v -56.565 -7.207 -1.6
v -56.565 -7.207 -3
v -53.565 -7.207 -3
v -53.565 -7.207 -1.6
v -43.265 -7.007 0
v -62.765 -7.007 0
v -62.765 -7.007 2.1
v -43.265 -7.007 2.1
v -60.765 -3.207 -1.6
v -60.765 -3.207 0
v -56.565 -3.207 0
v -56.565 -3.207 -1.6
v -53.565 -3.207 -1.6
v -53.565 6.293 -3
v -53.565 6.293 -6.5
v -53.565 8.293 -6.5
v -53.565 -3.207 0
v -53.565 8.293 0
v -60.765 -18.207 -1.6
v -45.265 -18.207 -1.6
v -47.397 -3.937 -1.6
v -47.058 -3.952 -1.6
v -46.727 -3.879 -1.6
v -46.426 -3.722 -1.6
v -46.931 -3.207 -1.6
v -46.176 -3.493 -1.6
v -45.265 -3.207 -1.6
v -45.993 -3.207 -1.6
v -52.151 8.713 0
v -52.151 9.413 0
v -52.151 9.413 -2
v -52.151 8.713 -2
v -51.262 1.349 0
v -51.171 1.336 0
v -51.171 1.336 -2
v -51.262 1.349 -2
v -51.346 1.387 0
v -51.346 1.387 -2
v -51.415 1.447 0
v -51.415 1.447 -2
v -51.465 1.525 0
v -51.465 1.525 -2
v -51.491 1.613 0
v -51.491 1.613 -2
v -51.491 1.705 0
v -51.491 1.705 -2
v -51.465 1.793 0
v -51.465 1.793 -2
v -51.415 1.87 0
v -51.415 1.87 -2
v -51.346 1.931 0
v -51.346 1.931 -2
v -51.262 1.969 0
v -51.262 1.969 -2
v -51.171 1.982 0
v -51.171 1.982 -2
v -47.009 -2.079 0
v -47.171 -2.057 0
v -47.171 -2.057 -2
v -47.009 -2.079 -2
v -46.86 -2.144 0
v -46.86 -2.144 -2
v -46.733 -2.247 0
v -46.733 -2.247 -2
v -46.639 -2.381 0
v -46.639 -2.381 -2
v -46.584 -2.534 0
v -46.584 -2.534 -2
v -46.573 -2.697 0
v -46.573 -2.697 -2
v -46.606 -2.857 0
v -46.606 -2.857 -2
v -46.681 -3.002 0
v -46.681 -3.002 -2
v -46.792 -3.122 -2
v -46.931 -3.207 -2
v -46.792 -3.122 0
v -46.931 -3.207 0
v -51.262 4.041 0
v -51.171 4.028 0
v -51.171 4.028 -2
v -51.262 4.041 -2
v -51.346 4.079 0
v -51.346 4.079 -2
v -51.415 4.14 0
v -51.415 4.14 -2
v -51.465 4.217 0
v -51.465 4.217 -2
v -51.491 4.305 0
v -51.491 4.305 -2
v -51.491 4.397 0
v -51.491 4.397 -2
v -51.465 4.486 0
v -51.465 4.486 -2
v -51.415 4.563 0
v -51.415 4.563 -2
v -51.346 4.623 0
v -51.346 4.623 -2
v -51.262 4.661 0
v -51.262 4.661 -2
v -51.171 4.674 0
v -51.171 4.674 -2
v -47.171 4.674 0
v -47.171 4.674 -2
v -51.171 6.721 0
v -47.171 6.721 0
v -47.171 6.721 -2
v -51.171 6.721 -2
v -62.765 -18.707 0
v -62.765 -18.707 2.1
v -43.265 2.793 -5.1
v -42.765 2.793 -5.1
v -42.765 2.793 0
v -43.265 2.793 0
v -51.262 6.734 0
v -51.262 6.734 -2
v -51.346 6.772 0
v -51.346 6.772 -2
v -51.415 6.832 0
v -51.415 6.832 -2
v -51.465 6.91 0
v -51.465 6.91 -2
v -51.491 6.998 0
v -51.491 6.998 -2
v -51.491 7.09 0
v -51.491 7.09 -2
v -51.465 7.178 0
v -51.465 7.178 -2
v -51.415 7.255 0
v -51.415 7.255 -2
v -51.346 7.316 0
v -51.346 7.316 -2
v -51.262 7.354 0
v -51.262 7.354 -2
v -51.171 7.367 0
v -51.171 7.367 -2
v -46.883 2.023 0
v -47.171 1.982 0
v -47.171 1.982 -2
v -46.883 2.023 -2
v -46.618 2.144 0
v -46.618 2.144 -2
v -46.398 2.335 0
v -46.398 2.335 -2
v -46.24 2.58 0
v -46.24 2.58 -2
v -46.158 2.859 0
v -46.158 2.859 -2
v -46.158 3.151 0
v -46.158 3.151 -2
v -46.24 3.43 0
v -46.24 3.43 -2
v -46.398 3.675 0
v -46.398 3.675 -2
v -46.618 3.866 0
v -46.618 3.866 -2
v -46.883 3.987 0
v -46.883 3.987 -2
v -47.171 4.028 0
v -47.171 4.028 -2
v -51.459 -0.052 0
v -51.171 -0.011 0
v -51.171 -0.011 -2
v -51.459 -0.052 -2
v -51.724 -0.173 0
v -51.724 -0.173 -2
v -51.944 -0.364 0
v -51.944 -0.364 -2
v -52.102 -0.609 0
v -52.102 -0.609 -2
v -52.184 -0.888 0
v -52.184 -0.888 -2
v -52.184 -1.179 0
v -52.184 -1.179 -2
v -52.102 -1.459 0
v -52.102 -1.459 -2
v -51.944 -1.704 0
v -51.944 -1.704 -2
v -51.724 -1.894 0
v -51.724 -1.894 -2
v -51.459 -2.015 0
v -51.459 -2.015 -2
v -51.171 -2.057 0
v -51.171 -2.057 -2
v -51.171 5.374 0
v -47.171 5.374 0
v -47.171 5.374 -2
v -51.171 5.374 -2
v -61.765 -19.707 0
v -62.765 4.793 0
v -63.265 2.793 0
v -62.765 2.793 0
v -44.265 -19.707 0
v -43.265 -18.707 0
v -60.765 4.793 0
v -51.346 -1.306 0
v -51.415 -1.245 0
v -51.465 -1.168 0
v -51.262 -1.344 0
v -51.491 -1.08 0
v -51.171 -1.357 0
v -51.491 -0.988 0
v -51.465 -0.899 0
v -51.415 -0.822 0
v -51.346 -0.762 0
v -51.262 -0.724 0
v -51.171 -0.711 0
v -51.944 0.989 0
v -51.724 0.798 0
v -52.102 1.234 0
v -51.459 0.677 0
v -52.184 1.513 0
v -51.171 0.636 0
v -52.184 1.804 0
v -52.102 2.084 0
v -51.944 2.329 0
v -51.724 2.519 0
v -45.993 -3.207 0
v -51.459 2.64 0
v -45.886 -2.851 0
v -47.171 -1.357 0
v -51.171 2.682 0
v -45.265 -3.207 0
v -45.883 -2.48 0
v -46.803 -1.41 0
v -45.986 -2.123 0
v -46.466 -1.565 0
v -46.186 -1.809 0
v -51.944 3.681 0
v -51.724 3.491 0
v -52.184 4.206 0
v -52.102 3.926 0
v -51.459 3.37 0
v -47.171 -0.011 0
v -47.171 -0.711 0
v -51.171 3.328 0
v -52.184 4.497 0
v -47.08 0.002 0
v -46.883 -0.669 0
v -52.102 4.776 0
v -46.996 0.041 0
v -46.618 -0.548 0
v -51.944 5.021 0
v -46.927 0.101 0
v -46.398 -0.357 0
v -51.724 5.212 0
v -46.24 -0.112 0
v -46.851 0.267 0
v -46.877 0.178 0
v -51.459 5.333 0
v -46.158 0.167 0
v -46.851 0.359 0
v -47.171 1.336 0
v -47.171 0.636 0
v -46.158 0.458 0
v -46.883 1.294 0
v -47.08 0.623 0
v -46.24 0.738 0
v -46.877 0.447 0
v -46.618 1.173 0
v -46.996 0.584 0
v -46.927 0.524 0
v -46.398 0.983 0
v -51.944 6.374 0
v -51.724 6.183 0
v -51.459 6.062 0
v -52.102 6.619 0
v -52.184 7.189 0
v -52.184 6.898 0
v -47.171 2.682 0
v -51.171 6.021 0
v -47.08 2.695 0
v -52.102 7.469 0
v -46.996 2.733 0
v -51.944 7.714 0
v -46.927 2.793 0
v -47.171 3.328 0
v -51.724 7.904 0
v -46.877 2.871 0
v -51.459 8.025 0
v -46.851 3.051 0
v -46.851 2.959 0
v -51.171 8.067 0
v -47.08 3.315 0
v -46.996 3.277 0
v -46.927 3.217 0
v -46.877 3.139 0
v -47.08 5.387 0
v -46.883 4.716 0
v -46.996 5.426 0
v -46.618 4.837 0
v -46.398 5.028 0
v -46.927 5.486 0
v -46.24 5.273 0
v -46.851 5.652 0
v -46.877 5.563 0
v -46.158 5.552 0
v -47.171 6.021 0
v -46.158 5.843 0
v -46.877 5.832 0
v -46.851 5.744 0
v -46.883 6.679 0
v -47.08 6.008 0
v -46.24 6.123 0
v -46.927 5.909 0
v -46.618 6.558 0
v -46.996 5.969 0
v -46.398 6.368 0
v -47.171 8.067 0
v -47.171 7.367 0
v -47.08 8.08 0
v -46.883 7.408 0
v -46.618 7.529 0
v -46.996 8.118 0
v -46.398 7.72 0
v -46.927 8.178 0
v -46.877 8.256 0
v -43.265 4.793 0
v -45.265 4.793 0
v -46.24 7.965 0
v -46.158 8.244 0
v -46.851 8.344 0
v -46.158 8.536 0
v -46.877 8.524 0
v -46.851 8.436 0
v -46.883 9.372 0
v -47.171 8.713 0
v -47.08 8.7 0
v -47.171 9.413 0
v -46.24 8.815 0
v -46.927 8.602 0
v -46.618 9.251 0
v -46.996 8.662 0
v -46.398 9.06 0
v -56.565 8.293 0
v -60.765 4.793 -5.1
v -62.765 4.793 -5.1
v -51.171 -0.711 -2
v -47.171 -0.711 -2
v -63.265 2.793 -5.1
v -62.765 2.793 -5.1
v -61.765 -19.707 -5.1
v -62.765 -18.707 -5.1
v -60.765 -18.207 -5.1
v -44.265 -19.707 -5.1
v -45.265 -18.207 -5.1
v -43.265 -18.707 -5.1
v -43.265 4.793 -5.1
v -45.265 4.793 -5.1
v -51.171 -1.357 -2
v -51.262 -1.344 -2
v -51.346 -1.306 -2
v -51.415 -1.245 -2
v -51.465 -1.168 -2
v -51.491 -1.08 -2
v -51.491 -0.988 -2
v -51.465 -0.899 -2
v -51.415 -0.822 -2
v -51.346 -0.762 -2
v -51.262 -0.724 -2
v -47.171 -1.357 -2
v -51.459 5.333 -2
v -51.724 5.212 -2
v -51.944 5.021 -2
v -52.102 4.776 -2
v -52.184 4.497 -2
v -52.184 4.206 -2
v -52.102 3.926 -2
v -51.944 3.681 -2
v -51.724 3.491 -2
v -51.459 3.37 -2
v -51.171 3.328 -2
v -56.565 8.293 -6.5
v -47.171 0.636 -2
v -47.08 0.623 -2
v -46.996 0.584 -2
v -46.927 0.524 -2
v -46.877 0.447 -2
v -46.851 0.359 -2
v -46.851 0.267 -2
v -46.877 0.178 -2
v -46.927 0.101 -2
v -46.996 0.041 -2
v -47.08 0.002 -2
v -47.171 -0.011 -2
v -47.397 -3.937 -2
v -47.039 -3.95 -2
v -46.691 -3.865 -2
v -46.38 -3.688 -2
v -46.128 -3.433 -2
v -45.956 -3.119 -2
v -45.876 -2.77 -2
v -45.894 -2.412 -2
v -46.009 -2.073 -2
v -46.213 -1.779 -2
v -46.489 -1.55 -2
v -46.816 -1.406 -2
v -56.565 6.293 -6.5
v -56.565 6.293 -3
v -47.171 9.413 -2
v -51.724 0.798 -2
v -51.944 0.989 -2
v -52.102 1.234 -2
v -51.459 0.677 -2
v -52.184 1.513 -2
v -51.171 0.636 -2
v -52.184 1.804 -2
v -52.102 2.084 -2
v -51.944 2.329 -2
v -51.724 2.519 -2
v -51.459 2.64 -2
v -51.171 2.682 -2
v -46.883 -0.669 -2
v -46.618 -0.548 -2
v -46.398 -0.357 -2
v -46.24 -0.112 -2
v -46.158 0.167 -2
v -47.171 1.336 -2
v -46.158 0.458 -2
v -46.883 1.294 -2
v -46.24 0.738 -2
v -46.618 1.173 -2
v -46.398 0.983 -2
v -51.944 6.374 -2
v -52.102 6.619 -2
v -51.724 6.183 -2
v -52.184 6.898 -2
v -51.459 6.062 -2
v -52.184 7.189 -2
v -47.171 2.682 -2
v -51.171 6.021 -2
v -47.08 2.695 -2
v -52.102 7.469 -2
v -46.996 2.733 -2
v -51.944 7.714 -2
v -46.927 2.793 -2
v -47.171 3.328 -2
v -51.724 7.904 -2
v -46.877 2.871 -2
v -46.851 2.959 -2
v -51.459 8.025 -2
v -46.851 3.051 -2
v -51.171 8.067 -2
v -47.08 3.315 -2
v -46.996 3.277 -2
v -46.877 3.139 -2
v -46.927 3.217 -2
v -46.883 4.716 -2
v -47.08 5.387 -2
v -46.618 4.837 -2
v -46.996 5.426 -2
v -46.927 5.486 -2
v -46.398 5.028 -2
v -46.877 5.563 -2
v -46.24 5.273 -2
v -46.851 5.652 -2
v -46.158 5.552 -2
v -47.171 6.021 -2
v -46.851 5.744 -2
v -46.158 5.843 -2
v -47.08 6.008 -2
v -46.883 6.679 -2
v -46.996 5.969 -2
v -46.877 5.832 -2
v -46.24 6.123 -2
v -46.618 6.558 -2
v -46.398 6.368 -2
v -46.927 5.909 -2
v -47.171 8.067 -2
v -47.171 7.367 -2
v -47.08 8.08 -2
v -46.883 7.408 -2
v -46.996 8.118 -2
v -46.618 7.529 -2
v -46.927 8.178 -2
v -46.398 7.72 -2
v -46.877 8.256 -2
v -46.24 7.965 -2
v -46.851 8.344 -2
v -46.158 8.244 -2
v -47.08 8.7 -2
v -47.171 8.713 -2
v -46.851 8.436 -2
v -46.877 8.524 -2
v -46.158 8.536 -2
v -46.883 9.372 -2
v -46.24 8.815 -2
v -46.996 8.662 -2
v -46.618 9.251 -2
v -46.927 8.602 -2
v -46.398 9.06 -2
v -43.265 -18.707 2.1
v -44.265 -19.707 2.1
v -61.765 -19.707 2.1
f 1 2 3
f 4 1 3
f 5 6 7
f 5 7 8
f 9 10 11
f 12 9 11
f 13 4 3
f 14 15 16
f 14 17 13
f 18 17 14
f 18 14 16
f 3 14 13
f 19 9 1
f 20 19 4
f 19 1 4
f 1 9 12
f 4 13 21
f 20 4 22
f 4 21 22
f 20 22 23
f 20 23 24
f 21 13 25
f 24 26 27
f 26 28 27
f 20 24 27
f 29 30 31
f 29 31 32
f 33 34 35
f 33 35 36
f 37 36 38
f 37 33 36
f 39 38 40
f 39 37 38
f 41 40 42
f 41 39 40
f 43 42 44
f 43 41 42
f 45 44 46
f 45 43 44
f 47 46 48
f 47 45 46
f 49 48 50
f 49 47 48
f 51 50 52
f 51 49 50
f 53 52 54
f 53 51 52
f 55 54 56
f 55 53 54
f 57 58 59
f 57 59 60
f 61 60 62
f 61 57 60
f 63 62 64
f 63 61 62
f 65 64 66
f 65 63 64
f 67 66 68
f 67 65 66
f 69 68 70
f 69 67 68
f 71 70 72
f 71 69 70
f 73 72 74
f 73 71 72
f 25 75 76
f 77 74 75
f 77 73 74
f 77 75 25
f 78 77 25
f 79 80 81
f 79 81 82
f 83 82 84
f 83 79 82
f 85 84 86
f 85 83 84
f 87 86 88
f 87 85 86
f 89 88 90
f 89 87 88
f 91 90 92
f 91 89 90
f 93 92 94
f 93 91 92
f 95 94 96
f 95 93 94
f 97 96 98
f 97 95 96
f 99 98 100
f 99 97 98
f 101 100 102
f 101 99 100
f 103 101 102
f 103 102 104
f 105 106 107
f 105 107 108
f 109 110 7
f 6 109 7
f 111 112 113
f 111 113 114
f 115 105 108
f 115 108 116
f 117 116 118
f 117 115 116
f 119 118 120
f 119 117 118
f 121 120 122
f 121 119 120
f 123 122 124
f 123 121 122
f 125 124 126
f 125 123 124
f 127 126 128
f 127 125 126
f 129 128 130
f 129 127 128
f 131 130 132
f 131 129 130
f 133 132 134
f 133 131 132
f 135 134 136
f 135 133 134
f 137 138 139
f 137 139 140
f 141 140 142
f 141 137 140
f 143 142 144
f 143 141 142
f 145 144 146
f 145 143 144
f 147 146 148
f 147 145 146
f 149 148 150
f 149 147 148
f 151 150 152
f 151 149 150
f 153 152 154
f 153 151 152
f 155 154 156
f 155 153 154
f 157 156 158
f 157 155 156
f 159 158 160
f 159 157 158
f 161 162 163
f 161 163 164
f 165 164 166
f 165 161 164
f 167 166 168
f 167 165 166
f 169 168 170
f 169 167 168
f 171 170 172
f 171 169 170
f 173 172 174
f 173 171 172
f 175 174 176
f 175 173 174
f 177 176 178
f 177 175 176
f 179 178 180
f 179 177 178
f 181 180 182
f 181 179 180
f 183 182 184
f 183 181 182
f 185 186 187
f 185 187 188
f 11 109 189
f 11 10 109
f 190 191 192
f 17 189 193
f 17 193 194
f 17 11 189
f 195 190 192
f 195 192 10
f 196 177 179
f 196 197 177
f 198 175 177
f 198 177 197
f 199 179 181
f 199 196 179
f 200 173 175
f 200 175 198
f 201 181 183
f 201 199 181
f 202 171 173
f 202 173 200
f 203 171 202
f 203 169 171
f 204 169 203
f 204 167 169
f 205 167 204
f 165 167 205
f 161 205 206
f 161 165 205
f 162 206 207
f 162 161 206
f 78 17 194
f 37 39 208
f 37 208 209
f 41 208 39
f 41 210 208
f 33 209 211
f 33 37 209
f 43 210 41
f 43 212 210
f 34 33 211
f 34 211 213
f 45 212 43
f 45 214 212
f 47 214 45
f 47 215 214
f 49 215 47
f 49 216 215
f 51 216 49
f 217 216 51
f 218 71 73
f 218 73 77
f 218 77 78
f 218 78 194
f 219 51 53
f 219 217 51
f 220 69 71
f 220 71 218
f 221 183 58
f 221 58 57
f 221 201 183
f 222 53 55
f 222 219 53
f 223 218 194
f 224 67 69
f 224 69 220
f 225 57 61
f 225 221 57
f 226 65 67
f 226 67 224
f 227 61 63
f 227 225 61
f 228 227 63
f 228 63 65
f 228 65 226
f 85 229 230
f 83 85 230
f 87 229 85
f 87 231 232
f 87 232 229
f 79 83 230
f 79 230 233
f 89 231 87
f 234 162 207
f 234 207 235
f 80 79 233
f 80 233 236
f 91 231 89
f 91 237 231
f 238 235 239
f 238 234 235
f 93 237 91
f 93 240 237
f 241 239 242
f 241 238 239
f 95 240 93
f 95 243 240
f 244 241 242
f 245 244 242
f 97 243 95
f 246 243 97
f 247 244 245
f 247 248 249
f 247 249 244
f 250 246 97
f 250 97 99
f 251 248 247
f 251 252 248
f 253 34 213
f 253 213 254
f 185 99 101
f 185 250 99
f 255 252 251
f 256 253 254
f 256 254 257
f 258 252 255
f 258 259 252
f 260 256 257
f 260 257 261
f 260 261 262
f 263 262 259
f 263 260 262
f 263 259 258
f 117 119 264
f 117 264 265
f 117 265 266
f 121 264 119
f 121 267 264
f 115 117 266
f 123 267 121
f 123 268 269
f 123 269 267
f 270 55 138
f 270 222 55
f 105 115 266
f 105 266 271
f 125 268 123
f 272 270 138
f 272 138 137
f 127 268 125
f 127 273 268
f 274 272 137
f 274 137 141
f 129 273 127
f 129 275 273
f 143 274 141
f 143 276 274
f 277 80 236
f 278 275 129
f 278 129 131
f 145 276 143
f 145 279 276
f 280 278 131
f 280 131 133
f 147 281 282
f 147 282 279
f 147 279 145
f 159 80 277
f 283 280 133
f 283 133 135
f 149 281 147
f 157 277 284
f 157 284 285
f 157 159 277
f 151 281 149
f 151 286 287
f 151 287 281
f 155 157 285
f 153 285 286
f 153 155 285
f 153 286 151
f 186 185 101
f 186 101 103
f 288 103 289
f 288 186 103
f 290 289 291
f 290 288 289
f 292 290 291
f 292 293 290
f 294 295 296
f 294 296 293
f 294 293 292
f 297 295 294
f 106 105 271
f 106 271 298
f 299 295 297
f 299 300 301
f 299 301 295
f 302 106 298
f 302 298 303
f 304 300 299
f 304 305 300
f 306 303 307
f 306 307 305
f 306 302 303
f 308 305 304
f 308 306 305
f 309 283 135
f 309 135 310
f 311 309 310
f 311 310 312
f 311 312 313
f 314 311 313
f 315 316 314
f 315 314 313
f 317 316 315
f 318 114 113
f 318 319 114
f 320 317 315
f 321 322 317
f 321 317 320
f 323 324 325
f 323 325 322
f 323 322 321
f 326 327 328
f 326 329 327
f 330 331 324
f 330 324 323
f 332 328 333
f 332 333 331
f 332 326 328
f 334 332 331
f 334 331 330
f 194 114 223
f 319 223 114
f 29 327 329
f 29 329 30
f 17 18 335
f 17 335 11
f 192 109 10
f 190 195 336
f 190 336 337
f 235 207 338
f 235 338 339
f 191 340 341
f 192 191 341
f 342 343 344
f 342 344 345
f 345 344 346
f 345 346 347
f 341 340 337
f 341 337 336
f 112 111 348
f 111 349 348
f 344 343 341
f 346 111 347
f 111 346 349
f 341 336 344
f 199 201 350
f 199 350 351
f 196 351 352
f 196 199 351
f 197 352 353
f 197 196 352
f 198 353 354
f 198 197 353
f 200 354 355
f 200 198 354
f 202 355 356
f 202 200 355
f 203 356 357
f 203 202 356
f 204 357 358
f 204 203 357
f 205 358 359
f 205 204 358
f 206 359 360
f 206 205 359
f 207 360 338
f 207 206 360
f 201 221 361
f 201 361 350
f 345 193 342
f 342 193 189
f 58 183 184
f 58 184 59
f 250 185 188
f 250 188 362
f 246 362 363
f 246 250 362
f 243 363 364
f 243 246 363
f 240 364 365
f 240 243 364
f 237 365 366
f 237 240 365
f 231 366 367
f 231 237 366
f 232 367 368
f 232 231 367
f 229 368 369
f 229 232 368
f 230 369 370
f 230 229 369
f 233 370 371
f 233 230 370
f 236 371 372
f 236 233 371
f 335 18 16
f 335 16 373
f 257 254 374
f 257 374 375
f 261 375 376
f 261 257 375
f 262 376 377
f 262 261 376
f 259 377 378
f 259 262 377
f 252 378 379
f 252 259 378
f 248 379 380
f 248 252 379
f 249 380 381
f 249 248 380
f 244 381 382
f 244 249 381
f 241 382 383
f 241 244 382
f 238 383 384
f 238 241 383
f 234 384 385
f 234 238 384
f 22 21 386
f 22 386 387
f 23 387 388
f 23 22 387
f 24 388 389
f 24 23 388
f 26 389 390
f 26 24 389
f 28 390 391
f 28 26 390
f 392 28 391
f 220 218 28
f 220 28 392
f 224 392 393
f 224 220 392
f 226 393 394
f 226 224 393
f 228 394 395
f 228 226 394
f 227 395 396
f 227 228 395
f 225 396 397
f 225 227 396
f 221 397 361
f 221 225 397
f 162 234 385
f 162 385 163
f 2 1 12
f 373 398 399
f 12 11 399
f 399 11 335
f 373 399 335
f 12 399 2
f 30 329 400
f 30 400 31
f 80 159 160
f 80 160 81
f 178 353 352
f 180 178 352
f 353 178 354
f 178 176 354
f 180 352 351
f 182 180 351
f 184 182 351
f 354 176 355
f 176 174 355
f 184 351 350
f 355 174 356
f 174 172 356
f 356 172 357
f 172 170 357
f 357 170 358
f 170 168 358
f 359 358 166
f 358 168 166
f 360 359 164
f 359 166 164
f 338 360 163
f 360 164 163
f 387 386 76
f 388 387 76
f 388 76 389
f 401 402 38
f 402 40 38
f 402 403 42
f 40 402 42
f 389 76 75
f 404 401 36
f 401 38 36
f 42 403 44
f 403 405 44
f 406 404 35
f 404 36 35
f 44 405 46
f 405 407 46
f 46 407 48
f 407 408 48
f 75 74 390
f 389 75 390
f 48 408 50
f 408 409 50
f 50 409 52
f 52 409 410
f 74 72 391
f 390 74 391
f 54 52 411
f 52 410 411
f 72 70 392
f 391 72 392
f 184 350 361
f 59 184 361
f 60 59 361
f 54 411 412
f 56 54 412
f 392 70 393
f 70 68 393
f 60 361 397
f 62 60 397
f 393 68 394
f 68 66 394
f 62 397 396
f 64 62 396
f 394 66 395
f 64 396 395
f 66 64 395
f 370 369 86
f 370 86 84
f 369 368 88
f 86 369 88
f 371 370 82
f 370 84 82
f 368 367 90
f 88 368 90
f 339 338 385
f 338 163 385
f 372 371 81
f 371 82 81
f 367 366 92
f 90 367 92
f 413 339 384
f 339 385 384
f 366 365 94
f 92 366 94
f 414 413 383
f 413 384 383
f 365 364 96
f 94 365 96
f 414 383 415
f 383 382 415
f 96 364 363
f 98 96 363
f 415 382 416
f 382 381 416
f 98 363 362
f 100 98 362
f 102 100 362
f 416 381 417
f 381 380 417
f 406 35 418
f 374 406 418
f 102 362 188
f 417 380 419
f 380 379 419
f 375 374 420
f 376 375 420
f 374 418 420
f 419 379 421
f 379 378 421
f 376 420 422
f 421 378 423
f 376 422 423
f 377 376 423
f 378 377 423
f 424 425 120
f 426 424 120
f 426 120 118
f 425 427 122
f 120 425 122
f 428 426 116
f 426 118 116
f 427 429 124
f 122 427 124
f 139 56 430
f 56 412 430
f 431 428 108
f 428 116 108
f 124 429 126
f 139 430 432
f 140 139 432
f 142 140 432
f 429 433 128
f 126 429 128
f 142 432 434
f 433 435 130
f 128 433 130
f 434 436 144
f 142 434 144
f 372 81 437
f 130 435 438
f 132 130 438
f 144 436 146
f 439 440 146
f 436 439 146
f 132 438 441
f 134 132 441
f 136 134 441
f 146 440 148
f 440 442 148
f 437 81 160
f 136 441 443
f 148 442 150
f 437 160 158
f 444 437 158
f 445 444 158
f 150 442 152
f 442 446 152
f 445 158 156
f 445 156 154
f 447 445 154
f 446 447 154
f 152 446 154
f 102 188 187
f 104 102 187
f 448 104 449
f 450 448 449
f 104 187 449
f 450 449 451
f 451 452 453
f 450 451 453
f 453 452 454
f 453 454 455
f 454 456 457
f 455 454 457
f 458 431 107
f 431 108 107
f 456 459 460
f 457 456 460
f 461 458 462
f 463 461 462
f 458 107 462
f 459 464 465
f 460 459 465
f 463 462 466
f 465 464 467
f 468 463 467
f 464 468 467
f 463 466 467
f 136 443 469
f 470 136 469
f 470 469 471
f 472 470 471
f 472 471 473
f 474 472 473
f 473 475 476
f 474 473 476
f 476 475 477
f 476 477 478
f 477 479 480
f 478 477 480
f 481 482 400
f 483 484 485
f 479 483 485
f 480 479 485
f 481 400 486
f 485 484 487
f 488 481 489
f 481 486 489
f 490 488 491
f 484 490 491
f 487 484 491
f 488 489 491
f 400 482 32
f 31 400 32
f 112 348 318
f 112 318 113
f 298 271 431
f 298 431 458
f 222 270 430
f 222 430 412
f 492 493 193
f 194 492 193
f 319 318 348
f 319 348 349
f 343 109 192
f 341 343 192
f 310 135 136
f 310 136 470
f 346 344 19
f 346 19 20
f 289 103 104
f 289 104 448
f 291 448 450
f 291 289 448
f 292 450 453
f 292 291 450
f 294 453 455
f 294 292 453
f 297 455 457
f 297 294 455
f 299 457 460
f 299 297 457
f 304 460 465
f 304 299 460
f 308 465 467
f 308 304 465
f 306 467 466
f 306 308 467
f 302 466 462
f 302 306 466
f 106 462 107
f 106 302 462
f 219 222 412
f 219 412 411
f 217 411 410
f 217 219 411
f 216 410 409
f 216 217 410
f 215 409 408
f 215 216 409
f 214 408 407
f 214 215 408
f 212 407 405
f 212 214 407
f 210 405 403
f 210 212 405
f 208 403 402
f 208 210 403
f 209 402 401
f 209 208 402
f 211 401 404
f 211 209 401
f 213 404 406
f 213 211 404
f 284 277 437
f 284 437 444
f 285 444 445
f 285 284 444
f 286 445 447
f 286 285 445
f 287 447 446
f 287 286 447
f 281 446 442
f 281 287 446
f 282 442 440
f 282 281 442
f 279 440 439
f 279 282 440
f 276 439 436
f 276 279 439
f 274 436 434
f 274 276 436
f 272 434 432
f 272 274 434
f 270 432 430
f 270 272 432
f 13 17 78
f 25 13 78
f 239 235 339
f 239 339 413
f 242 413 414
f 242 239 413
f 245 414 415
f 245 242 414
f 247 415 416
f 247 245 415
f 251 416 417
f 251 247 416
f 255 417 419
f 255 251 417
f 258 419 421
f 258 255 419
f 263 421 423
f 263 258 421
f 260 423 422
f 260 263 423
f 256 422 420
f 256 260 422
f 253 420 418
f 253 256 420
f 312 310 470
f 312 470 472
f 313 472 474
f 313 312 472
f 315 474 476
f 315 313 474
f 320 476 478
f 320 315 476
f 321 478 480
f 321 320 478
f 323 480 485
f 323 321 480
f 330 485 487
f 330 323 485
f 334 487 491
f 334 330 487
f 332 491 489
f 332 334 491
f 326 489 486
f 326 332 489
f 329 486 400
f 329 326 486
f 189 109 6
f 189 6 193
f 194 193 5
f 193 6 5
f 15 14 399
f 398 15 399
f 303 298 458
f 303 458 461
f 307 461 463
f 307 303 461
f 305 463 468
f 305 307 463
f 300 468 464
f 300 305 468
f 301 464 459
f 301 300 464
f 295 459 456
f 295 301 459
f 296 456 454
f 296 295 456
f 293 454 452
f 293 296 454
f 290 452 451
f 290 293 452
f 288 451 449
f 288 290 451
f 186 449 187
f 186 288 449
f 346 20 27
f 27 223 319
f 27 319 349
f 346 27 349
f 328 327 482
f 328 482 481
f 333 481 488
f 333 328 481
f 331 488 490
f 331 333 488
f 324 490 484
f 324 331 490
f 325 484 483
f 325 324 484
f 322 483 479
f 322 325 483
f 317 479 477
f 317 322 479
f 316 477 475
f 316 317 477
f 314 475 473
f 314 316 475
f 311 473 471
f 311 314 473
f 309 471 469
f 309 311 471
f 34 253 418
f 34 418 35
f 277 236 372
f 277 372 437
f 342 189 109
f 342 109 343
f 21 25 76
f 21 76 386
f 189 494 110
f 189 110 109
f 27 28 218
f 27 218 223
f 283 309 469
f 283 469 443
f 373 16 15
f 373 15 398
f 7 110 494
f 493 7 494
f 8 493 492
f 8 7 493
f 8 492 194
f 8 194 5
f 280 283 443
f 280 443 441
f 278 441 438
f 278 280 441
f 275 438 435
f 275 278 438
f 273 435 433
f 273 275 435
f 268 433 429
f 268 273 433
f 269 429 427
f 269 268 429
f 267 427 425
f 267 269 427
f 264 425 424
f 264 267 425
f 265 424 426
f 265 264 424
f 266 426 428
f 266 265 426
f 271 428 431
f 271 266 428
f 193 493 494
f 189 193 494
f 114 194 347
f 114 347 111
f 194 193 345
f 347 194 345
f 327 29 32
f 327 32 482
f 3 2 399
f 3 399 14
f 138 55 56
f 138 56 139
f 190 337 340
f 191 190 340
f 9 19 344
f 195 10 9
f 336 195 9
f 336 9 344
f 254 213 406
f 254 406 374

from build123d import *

# Parameters (mm, degrees)
SKETCH_1_W           = 19.5
SKETCH_1_H           = 12.7
EXTRUDE_1_DEPTH      = 2.1
SKETCH_2_W           = 19.5
SKETCH_2_H           = 24.5
EXTRUDE_2_DEPTH      = 5.1
SKETCH_3_W           = 15.5
SKETCH_3_H           = 3.5
CUT_EXTRUDE_1_DEPTH  = 23
CUT_EXTRUDE_2_REACH  = 67.984
SKETCH_4_W           = 15.5
SKETCH_4_H           = 8
EXTRUDE_4_DEPTH      = 5.1
EXTRUDE_5_DEPTH      = 2
EXTRUDE_6_DEPTH      = 11.5
EXTRUDE_6_DEPTH_BACK = 4
SKETCH_8_W           = 3
SKETCH_8_H           = 3
SKETCH_9_W           = 3
SKETCH_9_H           = 2
EXTRUDE_7_DEPTH      = 3.5
CHAMFER_1_SIZE       = 1


# Read off the part's stored shape, not the designer's step: 分割1
with BuildPart() as part:
    # 草图1 → 凸台-拉伸1 (new body)
    with BuildSketch(Plane.XY):
        with Locations((-53.015330564, -13.356843897)):
            Rectangle(SKETCH_1_W, SKETCH_1_H)
    extrude(amount=EXTRUDE_1_DEPTH)

    # 草图2 → 凸台-拉伸2 (add)
    with BuildSketch(Plane(origin=(0, 0, 0), x_dir=(-1, 0, 0), z_dir=(0, 0, -1))):
        with Locations((53.015330564, -7.456843897)):
            Rectangle(SKETCH_2_W, SKETCH_2_H)
    extrude(amount=EXTRUDE_2_DEPTH)

    # 草图3 → 切除-拉伸1 (cut)
    with BuildSketch(Plane(origin=(0, 4.793156103, 0), x_dir=(1, 0, 0), z_dir=(0, 1, 0))):
        with Locations((-53.015330564, 3.35)):
            Rectangle(SKETCH_3_W, SKETCH_3_H)
    extrude(amount=-CUT_EXTRUDE_1_DEPTH, mode=Mode.SUBTRACT)

    # 草图4 → 切除-拉伸2 (cut, up to next)
    with BuildSketch(Plane.XY, mode=Mode.PRIVATE) as cut_extrude_2_sk1:
        with Locations((-53.015330564, 0.793156103)):
            Rectangle(SKETCH_4_W, SKETCH_4_H)
    cut_extrude_2_tool1 = extrude(cut_extrude_2_sk1.sketch, amount=-CUT_EXTRUDE_2_REACH, mode=Mode.PRIVATE) & part.part
    add(cut_extrude_2_tool1.solids().sort_by_distance((-53.015331, 0.793156, 0))[0], mode=Mode.SUBTRACT)

    # 草图5 → 凸台-拉伸4 (add)
    with BuildSketch(Plane(origin=(0, 0, -5.1), x_dir=(-1, 0, 0), z_dir=(0, 0, -1))):
        Polygon((62.765330564, 4.793156103), (63.265330564, 2.793156103), (62.765330564, 2.793156103), align=None)
        Polygon((43.265330564, 4.793156103), (42.765330564, 2.793156103), (43.265330564, 2.793156103), align=None)
    extrude(amount=-EXTRUDE_4_DEPTH)

    # 草图7 → 凸台-拉伸5 (add)
    with BuildSketch(Plane.XY):
        with BuildLine():
            Line((-47.171144023, -1.356843897), (-51.171144023, -1.356843897))
            ThreePointArc((-51.171144023, -1.356843897), (-51.494269023, -1.033718897), (-51.171144023, -0.710593897))
            Line((-51.171144023, -0.710593897), (-47.171144023, -0.710593897))
            ThreePointArc((-47.171144023, -0.710593897), (-46.148019023, 0.312531103), (-47.171144023, 1.335656103))
            Line((-47.171144023, 1.335656103), (-51.171144023, 1.335656103))
            ThreePointArc((-51.171144023, 1.335656103), (-51.494269023, 1.658781103), (-51.171144023, 1.981906103))
            Line((-51.171144023, 1.981906103), (-47.171144023, 1.981906103))
            ThreePointArc((-47.171144023, 1.981906103), (-46.148019023, 3.005031103), (-47.171144023, 4.028156103))
            Line((-47.171144023, 4.028156103), (-51.171144023, 4.028156103))
            ThreePointArc((-51.171144023, 4.028156103), (-51.494269023, 4.351281103), (-51.171144023, 4.674406103))
            Line((-51.171144023, 4.674406103), (-47.171144023, 4.674406103))
            ThreePointArc((-47.171144023, 4.674406103), (-46.148019023, 5.697531103), (-47.171144023, 6.720656103))
            Line((-47.171144023, 6.720656103), (-51.171144023, 6.720656103))
            ThreePointArc((-51.171144023, 6.720656103), (-51.494269023, 7.043781103), (-51.171144023, 7.366906103))
            Line((-51.171144023, 7.366906103), (-47.171144023, 7.366906103))
            ThreePointArc((-47.171144023, 7.366906103), (-46.148019023, 8.390031103), (-47.171144023, 9.413156103))
            Line((-47.171144023, 9.413156103), (-52.150877486, 9.413156103))
            Line((-52.150877486, 9.413156103), (-52.150877486, 8.713156103))
            Line((-52.150877486, 8.713156103), (-47.171144023, 8.713156103))
            ThreePointArc((-47.171144023, 8.713156103), (-46.848019023, 8.390031103), (-47.171144023, 8.066906103))
            Line((-47.171144023, 8.066906103), (-51.171144023, 8.066906103))
            ThreePointArc((-51.171144023, 8.066906103), (-52.194269023, 7.043781103), (-51.171144023, 6.020656103))
            Line((-51.171144023, 6.020656103), (-47.171144023, 6.020656103))
            ThreePointArc((-47.171144023, 6.020656103), (-46.848019023, 5.697531103), (-47.171144023, 5.374406103))
            Line((-47.171144023, 5.374406103), (-51.171144023, 5.374406103))
            ThreePointArc((-51.171144023, 5.374406103), (-52.194269023, 4.351281103), (-51.171144023, 3.328156103))
            Line((-51.171144023, 3.328156103), (-47.171144023, 3.328156103))
            ThreePointArc((-47.171144023, 3.328156103), (-46.848019023, 3.005031103), (-47.171144023, 2.681906103))
            Line((-47.171144023, 2.681906103), (-51.171144023, 2.681906103))
            ThreePointArc((-51.171144023, 2.681906103), (-52.194269023, 1.658781103), (-51.171144023, 0.635656103))
            Line((-51.171144023, 0.635656103), (-47.171144023, 0.635656103))
            ThreePointArc((-47.171144023, 0.635656103), (-46.848019023, 0.312531103), (-47.171144023, -0.010593897))
            Line((-47.171144023, -0.010593897), (-51.171144023, -0.010593897))
            ThreePointArc((-51.171144023, -0.010593897), (-52.194269023, -1.033718897), (-51.171144023, -2.056843897))
            Line((-51.171144023, -2.056843897), (-47.171144023, -2.056843897))
            ThreePointArc((-47.171144023, -2.056843897), (-46.583777016, -2.53436941), (-46.931352446, -3.206843897))
            Line((-46.931352446, -3.206843897), (-47.396871104, -3.937096718))
            ThreePointArc((-47.396871104, -3.937096718), (-45.876090227, -2.770138498), (-47.171144023, -1.356843897))
        make_face()
    extrude(amount=-EXTRUDE_5_DEPTH)

    # 草图8 → 凸台-拉伸6 (add, two sides: drawn at the far end of the back side and taken through both)
    with BuildSketch(Plane(origin=(0, -3.206843897, 0), x_dir=(1, 0, 0), z_dir=(0, 1, 0)).offset(-EXTRUDE_6_DEPTH_BACK)):
        with Locations((-55.065330564, 1.5)):
            Rectangle(SKETCH_8_W, SKETCH_8_H)
    extrude(amount=EXTRUDE_6_DEPTH + EXTRUDE_6_DEPTH_BACK)

    # 草图9 → 凸台-拉伸7 (add)
    with BuildSketch(Plane(origin=(0, 0, -3), x_dir=(-1, 0, 0), z_dir=(0, 0, -1))):
        with Locations((55.065330564, 7.293156103)):
            Rectangle(SKETCH_9_W, SKETCH_9_H)
    extrude(amount=EXTRUDE_7_DEPTH)

    # 倒角1
    chamfer_1_edges = [part.edges().sort_by_distance(p)[0] for p in [
        (-43.265330564, -19.706843897, -1.5),
        (-62.765330564, -19.706843897, -1.5),
    ]]
    chamfer(chamfer_1_edges, length=CHAMFER_1_SIZE)


with BuildPart() as body_2:
    # Split Bodies 1: the piece on the far side of the plane
    add(part.part)
    split(bisect_by=Plane.XY, keep=Keep.BOTTOM)


with BuildPart() as part_1:
    add(part.part)

    # Split Bodies 1
    split(bisect_by=Plane.XY, keep=Keep.TOP)


solid = Compound([body_2.part, part_1.part])
